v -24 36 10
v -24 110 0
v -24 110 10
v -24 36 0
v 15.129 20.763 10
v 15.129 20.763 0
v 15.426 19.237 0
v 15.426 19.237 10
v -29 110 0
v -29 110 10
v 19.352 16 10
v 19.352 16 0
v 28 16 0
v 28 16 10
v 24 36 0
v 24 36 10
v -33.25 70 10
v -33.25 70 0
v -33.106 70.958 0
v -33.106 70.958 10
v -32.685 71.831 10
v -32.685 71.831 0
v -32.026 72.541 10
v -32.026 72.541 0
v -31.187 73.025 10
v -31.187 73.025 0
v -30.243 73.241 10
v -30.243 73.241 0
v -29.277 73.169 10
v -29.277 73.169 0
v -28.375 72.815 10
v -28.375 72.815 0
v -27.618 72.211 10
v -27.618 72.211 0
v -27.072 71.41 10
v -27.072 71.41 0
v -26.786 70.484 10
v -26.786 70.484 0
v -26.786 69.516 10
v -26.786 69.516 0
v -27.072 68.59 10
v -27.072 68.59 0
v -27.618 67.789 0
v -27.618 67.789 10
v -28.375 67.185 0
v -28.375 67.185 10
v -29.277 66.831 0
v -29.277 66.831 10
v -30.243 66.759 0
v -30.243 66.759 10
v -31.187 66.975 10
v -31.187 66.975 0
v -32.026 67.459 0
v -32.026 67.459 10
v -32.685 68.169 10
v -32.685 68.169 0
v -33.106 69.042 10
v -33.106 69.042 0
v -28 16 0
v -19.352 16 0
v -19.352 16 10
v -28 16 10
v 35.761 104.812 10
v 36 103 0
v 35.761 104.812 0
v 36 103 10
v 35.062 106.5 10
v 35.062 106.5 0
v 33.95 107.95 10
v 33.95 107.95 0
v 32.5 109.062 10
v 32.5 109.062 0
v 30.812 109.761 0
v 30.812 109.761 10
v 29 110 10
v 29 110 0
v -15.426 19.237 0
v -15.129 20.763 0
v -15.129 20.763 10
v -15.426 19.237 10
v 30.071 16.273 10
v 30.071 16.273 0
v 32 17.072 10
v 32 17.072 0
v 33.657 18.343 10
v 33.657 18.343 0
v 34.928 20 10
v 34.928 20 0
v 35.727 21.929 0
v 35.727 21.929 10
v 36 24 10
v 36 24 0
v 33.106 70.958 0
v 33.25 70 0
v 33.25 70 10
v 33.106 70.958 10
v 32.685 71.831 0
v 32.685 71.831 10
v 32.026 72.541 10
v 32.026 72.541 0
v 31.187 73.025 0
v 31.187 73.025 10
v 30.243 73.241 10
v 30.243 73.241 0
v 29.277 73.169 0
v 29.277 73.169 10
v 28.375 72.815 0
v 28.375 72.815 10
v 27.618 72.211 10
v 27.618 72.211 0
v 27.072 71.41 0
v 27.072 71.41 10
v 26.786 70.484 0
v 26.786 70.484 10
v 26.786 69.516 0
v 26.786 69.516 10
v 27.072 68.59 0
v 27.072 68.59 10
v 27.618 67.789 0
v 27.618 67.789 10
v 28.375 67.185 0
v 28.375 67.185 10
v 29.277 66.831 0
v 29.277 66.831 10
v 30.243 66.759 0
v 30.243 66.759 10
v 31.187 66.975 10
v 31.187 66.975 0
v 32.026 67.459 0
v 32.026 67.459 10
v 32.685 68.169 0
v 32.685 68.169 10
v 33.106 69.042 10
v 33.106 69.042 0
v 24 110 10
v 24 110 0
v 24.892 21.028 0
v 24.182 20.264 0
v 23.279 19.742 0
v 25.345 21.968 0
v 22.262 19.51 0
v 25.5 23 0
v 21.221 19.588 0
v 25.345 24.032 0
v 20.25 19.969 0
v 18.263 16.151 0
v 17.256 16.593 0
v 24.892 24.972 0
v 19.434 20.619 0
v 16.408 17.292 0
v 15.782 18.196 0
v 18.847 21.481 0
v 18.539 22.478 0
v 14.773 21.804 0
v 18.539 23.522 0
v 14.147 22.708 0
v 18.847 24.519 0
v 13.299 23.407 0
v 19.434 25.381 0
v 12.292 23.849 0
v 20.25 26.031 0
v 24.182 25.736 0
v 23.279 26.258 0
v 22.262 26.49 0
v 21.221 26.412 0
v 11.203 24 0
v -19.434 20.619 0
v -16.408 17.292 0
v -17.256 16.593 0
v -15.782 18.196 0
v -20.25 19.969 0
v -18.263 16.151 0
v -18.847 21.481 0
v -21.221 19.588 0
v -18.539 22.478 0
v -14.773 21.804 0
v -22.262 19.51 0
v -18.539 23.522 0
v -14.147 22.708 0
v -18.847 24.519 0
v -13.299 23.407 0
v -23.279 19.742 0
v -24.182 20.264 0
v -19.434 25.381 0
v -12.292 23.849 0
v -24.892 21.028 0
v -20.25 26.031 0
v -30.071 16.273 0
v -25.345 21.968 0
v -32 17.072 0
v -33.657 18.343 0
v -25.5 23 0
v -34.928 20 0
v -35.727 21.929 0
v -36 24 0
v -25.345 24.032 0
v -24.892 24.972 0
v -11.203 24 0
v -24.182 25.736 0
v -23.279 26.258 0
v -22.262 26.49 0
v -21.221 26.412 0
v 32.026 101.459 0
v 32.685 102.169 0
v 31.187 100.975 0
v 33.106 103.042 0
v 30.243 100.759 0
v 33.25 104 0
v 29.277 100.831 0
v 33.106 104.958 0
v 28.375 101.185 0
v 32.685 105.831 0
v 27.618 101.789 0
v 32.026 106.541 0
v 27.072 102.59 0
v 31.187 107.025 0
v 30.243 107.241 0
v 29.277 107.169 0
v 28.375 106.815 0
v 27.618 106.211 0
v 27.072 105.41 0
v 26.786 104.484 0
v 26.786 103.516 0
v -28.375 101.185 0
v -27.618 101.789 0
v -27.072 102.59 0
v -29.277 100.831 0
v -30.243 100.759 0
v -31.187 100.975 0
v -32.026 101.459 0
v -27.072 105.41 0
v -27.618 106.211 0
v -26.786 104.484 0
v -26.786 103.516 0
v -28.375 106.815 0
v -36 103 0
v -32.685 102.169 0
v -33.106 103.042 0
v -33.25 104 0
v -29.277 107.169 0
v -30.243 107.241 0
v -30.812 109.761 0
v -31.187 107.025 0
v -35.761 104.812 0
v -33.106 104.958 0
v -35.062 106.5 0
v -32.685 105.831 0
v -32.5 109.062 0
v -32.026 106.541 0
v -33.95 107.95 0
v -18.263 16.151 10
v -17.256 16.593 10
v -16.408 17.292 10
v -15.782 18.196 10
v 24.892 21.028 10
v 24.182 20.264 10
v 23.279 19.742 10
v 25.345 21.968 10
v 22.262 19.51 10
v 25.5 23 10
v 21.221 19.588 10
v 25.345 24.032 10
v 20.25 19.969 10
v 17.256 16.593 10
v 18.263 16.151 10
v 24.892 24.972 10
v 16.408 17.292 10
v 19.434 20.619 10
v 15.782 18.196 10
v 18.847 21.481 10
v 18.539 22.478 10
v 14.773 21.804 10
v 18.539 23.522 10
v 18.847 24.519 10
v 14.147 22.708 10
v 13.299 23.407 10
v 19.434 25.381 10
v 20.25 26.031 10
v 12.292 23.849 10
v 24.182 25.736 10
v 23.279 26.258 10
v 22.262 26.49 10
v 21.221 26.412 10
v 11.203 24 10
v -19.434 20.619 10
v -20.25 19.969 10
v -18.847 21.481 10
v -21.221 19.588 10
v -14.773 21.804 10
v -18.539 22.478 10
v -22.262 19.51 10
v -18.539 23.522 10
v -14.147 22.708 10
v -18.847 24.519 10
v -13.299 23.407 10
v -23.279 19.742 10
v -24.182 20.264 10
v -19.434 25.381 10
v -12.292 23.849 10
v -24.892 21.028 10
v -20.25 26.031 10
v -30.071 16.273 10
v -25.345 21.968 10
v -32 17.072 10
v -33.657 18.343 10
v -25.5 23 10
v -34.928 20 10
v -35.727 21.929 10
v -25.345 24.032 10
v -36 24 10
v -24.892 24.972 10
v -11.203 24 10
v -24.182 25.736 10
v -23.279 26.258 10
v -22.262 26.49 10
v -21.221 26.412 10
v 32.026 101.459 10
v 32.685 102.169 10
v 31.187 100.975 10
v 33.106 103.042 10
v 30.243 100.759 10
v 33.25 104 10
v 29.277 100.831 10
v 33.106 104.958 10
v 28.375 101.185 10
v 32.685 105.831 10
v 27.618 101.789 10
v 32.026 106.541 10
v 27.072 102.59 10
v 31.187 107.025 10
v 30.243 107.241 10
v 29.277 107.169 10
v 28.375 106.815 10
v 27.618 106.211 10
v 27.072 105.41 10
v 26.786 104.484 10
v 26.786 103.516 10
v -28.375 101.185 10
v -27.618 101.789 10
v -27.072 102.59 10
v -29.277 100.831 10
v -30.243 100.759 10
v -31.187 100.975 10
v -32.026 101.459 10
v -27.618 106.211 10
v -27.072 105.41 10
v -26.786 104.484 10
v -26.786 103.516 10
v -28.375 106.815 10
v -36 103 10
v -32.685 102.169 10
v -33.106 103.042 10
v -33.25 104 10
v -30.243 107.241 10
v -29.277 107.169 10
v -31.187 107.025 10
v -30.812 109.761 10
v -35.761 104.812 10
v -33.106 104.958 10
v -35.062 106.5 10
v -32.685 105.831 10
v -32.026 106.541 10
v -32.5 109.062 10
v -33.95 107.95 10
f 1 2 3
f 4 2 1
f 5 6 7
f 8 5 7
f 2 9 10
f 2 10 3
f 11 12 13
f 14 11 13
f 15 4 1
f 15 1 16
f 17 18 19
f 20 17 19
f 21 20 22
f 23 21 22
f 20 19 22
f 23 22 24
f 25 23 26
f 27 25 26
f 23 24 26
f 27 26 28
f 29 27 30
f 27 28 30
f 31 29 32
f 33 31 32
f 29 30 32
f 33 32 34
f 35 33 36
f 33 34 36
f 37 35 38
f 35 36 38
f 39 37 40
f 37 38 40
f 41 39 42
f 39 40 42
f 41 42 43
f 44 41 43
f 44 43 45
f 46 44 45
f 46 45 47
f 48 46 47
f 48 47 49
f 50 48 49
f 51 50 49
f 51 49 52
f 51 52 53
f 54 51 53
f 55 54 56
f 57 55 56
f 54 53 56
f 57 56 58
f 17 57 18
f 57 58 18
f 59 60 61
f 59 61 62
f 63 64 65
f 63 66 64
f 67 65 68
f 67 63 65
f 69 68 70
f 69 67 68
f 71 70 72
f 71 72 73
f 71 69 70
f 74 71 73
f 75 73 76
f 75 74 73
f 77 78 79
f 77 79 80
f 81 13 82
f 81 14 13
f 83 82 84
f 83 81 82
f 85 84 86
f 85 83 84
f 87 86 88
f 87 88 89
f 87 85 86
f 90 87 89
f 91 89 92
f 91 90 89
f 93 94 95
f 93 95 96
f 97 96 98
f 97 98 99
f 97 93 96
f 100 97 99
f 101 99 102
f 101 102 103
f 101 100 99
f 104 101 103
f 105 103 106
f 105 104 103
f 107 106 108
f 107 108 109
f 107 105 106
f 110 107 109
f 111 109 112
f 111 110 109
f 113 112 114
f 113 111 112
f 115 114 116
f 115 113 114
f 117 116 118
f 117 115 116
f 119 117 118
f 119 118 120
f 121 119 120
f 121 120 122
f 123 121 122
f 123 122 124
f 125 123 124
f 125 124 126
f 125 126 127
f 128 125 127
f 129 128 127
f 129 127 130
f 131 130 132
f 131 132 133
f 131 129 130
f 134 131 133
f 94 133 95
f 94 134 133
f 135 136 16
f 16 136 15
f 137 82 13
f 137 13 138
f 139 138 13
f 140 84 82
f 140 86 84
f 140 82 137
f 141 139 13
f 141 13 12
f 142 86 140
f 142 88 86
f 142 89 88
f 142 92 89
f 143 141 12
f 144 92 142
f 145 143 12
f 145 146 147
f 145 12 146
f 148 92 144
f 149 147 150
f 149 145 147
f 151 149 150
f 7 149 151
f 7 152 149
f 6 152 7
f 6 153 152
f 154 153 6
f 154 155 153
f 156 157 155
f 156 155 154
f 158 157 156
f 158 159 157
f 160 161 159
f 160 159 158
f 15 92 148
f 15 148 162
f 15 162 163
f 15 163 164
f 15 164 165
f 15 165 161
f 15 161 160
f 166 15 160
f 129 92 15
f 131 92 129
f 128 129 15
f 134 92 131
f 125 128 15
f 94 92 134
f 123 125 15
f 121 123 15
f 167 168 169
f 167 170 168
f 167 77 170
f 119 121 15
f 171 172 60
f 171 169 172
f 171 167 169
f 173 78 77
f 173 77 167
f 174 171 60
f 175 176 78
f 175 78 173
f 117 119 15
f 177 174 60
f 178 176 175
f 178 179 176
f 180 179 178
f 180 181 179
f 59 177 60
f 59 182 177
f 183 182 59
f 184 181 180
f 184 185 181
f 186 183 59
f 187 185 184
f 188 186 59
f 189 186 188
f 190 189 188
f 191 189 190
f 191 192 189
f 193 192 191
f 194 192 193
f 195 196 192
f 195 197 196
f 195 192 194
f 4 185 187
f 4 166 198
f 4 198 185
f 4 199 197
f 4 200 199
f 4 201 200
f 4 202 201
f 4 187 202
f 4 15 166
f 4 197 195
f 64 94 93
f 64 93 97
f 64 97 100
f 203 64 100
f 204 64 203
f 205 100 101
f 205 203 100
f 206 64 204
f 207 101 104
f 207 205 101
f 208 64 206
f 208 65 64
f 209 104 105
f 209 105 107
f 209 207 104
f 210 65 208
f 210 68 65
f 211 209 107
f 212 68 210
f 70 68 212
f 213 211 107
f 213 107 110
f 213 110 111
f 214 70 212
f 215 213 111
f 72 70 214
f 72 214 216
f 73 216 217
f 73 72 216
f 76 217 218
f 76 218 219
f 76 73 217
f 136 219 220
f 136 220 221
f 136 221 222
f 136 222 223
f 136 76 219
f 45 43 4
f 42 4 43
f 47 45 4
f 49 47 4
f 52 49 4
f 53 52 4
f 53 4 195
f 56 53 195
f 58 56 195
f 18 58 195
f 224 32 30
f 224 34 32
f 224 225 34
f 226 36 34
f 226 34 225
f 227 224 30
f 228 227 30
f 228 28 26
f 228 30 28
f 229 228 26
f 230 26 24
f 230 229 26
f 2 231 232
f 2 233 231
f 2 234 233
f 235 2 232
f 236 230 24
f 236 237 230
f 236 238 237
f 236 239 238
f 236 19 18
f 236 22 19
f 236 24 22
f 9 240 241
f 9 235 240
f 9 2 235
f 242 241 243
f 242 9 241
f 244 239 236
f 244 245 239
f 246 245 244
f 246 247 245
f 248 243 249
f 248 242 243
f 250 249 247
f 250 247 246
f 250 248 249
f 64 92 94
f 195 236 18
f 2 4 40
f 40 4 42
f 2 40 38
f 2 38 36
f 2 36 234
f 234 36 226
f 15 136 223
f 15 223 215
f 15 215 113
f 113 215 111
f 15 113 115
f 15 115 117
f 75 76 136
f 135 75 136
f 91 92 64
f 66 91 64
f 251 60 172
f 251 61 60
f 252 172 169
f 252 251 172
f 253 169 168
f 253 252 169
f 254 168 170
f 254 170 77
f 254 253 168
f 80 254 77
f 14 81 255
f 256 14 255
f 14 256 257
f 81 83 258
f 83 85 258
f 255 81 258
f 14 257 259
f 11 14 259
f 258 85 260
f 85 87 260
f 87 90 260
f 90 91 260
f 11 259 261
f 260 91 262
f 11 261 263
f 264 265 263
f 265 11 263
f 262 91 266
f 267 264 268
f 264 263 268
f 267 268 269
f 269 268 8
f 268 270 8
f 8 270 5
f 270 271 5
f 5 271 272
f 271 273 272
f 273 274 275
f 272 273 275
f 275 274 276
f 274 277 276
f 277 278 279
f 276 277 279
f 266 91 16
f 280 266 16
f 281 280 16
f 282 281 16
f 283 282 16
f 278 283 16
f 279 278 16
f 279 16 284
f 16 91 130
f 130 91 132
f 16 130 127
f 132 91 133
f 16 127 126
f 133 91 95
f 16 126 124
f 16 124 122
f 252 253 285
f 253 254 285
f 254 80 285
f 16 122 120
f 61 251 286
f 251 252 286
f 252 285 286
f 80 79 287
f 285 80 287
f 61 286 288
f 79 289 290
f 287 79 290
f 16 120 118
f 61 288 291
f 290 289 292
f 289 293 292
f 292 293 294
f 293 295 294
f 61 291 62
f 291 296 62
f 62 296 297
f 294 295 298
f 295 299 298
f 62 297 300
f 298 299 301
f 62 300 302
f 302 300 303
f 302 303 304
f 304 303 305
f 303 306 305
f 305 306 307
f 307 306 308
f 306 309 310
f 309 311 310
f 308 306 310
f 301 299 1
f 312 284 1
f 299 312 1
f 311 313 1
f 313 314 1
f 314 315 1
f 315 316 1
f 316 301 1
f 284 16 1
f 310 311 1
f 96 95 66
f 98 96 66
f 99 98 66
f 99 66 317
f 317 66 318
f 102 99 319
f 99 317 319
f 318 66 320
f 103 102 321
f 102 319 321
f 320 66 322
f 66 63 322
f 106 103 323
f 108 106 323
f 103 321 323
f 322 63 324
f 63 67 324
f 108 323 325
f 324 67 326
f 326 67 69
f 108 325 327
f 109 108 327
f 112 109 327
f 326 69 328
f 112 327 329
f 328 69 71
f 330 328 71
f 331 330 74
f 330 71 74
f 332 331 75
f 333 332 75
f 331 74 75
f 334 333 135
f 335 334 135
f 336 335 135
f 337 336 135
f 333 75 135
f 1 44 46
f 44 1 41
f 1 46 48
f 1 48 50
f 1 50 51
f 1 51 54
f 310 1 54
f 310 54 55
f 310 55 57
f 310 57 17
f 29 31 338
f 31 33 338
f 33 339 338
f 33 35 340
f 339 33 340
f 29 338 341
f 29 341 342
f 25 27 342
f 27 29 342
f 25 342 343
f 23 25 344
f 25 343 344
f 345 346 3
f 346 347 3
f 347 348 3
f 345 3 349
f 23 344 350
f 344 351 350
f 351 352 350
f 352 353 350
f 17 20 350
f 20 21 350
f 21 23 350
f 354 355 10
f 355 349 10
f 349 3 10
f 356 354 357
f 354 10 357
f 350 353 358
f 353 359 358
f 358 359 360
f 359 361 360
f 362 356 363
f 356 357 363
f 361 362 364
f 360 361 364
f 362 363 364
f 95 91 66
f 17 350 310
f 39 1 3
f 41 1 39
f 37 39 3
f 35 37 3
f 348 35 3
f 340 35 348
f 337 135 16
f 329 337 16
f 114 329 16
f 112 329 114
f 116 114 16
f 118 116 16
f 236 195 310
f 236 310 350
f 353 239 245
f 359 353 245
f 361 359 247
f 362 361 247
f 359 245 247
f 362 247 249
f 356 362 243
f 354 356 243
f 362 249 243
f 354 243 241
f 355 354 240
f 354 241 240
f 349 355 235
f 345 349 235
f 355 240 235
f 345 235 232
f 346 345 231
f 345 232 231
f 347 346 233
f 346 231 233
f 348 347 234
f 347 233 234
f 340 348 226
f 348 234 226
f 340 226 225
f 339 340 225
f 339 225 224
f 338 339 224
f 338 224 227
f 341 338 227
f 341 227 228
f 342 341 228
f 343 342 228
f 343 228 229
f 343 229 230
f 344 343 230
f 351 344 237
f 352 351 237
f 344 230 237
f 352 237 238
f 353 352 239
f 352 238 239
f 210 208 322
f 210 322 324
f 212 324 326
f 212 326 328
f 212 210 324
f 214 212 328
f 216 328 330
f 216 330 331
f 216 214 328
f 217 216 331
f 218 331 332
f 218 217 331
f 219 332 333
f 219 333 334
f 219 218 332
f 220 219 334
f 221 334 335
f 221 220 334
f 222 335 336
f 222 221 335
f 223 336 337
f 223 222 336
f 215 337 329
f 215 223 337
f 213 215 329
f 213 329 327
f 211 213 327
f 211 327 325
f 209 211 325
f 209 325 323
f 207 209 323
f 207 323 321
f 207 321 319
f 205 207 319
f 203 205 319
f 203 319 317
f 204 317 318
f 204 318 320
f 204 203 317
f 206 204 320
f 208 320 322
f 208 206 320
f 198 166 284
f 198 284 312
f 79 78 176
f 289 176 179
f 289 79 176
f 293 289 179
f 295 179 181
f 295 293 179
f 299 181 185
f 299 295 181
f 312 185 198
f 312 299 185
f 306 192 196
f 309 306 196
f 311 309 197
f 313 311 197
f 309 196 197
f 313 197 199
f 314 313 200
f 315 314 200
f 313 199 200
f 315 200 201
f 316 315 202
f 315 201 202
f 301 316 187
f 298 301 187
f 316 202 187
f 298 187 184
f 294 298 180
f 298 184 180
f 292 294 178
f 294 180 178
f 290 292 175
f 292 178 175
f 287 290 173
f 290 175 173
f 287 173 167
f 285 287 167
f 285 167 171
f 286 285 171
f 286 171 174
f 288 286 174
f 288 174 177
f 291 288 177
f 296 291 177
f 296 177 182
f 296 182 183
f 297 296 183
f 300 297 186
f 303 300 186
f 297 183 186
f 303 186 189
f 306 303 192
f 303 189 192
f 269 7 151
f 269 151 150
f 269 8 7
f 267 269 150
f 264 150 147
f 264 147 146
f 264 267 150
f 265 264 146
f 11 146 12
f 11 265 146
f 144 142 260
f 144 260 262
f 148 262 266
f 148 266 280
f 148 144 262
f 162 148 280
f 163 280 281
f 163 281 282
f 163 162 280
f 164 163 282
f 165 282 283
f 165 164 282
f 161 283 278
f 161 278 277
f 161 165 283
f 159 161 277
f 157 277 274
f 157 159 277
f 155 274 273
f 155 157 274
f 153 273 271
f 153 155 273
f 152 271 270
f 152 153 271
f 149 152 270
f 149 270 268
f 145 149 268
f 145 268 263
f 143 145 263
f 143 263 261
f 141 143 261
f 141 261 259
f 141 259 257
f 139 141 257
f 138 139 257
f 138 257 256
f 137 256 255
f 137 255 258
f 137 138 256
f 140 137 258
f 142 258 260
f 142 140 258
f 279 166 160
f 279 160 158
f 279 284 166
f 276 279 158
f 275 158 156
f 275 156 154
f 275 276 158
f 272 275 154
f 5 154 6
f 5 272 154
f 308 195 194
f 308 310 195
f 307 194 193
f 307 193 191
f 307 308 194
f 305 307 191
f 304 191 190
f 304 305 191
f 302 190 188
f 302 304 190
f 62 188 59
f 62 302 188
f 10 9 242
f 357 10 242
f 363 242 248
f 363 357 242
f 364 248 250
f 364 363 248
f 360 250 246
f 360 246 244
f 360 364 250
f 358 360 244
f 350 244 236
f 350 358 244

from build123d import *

# Parameters (mm, degrees)
ESQUISSE1_R        = 3.25
ESQUISSE1_R_2      = 3.5
BOSS_EXTRU_1_DEPTH = 10
CONG_1_R           = 4
CONG_2_R           = 8
CONG_3_R           = 7


with BuildPart() as part:
    # Esquisse1 → Boss.-Extru.1 (new body)
    with BuildSketch(Plane.XY):
        Polygon((24, 110), (24, 36), (0, 36), (0, 24), (14.5, 24), (16.055042473, 16), (36, 16), (36, 110), align=None)
        with Locations((30, 104)):
            Circle(ESQUISSE1_R, mode=Mode.SUBTRACT)
        with Locations((22, 23)):
            Circle(ESQUISSE1_R_2, mode=Mode.SUBTRACT)
        with Locations((30, 70)):
            Circle(ESQUISSE1_R, mode=Mode.SUBTRACT)
    boss_extru_1 = extrude(amount=BOSS_EXTRU_1_DEPTH)

    # Symétrie2: Boss.-Extru.1 across plane
    add(boss_extru_1.mirror(Plane(origin=(0, 36, 10), x_dir=(0, 0, 1), z_dir=(1, 0, 0))))

    # Congé1
    cong_1_edges = [part.edges().sort_by_distance(p)[0] for p in [
        (16.055042473, 16, 5),
        (14.5, 24, 5),
        (-14.5, 24, 5),
        (-16.055042473, 16, 5),
    ]]
    fillet(cong_1_edges, radius=CONG_1_R)

    # Congé2
    cong_2_edges = [part.edges().sort_by_distance(p)[0] for p in [
        (36, 16, 5),
        (-36, 16, 5),
    ]]
    fillet(cong_2_edges, radius=CONG_2_R)

    # Congé3
    cong_3_edges = [part.edges().sort_by_distance(p)[0] for p in [
        (36, 110, 5),
        (-36, 110, 5),
    ]]
    fillet(cong_3_edges, radius=CONG_3_R)


solid = part.part
